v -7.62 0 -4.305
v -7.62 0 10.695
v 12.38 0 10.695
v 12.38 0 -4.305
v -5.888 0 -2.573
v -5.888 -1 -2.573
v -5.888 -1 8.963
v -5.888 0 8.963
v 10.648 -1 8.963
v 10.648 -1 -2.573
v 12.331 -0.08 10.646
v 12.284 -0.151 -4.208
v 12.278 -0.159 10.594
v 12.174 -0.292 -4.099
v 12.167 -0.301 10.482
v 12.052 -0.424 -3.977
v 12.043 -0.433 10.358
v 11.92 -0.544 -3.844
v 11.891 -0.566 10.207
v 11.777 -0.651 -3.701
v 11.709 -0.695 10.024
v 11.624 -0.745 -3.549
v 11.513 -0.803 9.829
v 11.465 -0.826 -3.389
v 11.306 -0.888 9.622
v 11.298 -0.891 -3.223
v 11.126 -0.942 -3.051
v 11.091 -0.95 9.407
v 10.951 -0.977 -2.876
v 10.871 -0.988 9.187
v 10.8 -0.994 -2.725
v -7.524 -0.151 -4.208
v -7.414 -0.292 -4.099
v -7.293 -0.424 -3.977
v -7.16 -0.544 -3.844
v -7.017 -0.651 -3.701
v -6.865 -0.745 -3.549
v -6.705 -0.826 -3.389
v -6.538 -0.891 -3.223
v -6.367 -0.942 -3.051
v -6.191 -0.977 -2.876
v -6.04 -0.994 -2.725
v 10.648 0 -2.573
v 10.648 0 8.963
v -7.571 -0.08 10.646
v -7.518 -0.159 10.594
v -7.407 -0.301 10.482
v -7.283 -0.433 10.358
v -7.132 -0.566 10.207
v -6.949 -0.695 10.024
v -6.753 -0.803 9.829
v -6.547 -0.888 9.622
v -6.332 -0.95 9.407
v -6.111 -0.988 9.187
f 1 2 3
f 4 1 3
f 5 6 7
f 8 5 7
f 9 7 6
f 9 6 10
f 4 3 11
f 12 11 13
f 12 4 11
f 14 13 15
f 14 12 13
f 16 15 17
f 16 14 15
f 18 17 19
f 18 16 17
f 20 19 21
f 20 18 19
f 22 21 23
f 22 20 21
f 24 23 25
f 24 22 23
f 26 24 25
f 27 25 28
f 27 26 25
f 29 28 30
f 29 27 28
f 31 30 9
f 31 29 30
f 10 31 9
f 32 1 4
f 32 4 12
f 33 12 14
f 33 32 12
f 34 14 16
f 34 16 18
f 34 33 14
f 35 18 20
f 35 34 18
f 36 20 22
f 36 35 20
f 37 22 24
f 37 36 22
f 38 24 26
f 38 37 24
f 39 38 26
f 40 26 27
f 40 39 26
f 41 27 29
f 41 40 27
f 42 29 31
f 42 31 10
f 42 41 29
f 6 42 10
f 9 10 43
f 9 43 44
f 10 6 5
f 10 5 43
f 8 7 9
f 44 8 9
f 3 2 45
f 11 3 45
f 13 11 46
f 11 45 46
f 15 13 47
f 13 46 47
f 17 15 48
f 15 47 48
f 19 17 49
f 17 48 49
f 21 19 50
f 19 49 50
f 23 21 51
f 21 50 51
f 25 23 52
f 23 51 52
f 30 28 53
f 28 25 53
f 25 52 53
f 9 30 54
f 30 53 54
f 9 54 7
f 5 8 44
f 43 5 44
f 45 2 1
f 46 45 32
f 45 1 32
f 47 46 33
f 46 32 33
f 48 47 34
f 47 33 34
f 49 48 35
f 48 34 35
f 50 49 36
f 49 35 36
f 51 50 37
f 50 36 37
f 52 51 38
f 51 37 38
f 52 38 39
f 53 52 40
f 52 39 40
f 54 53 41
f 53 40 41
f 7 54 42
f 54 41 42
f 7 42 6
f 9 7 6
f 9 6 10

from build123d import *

# Parameters (mm, degrees)
F0_W        = 20
F0_H        = 15
F1_DEPTH    = 1
F2_T1_DEPTH = 28.6602540378
F2_T3_DEPTH = 23.6602540378
F3_W        = 16.5358983849
F3_H        = 11.5358983849
F4_DEPTH    = 1


# Not quite as in the source:
# - a fillet or chamfer that OpenCascade refuses, or shapes differently, is made with other operations: its cross-section is extruded or revolved along the edge and cut away or added


with BuildPart() as f1:
    # F0 (on Front) → F1 (new body)
    with BuildSketch(Plane.XZ):
        with Locations((2.3798597425, 3.1954329461)):
            Rectangle(F0_W, F0_H)
    extrude(amount=F1_DEPTH)

    # F2: fillet of radius 2 on 4 edges, made by hand

    # F2_s2 → F2_t1 (cut)
    with BuildSketch(Plane.YZ.offset(-11.9502672764)):
        with BuildLine():
            ThreePointArc((0, 10.6954329461), (-0.7320508076, 9.9633821385), (-1, 8.9633821385))
            Line((-1, 8.9633821385), (-1, 10.6954329461))
            Line((-1, 10.6954329461), (0, 10.6954329461))
        make_face()
        with BuildLine():
            ThreePointArc((0, -4.3045670539), (-0.7320508076, -3.5725162463), (-1, -2.5725162463))
            Line((-1, -2.5725162463), (-1, -4.3045670539))
            Line((-1, -4.3045670539), (0, -4.3045670539))
        make_face()
    extrude(amount=F2_T1_DEPTH, mode=Mode.SUBTRACT)

    # F2_s4 → F2_t3 (cut)
    with BuildSketch(Plane.XY.offset(-8.6346940728)):
        with BuildLine():
            ThreePointArc((12.3798597425, 0), (11.6478089349, -0.7320508076), (10.6478089349, -1))
            Line((10.6478089349, -1), (12.3798597425, -1))
            Line((12.3798597425, -1), (12.3798597425, 0))
        make_face()
        with BuildLine():
            ThreePointArc((-7.6201402575, 0), (-6.8880894499, -0.7320508076), (-5.8880894499, -1))
            Line((-5.8880894499, -1), (-7.6201402575, -1))
            Line((-7.6201402575, -1), (-7.6201402575, 0))
        make_face()
    extrude(amount=F2_T3_DEPTH, mode=Mode.SUBTRACT)


with BuildPart() as f4:
    # F3 (on face) → F4 (new body)
    with BuildSketch(Plane.XZ.offset(1)):
        with Locations((2.3798597425, 3.1954329461)):
            Rectangle(F3_W, F3_H)
    extrude(amount=-F4_DEPTH)


solid = Compound([f1.part, f4.part])
